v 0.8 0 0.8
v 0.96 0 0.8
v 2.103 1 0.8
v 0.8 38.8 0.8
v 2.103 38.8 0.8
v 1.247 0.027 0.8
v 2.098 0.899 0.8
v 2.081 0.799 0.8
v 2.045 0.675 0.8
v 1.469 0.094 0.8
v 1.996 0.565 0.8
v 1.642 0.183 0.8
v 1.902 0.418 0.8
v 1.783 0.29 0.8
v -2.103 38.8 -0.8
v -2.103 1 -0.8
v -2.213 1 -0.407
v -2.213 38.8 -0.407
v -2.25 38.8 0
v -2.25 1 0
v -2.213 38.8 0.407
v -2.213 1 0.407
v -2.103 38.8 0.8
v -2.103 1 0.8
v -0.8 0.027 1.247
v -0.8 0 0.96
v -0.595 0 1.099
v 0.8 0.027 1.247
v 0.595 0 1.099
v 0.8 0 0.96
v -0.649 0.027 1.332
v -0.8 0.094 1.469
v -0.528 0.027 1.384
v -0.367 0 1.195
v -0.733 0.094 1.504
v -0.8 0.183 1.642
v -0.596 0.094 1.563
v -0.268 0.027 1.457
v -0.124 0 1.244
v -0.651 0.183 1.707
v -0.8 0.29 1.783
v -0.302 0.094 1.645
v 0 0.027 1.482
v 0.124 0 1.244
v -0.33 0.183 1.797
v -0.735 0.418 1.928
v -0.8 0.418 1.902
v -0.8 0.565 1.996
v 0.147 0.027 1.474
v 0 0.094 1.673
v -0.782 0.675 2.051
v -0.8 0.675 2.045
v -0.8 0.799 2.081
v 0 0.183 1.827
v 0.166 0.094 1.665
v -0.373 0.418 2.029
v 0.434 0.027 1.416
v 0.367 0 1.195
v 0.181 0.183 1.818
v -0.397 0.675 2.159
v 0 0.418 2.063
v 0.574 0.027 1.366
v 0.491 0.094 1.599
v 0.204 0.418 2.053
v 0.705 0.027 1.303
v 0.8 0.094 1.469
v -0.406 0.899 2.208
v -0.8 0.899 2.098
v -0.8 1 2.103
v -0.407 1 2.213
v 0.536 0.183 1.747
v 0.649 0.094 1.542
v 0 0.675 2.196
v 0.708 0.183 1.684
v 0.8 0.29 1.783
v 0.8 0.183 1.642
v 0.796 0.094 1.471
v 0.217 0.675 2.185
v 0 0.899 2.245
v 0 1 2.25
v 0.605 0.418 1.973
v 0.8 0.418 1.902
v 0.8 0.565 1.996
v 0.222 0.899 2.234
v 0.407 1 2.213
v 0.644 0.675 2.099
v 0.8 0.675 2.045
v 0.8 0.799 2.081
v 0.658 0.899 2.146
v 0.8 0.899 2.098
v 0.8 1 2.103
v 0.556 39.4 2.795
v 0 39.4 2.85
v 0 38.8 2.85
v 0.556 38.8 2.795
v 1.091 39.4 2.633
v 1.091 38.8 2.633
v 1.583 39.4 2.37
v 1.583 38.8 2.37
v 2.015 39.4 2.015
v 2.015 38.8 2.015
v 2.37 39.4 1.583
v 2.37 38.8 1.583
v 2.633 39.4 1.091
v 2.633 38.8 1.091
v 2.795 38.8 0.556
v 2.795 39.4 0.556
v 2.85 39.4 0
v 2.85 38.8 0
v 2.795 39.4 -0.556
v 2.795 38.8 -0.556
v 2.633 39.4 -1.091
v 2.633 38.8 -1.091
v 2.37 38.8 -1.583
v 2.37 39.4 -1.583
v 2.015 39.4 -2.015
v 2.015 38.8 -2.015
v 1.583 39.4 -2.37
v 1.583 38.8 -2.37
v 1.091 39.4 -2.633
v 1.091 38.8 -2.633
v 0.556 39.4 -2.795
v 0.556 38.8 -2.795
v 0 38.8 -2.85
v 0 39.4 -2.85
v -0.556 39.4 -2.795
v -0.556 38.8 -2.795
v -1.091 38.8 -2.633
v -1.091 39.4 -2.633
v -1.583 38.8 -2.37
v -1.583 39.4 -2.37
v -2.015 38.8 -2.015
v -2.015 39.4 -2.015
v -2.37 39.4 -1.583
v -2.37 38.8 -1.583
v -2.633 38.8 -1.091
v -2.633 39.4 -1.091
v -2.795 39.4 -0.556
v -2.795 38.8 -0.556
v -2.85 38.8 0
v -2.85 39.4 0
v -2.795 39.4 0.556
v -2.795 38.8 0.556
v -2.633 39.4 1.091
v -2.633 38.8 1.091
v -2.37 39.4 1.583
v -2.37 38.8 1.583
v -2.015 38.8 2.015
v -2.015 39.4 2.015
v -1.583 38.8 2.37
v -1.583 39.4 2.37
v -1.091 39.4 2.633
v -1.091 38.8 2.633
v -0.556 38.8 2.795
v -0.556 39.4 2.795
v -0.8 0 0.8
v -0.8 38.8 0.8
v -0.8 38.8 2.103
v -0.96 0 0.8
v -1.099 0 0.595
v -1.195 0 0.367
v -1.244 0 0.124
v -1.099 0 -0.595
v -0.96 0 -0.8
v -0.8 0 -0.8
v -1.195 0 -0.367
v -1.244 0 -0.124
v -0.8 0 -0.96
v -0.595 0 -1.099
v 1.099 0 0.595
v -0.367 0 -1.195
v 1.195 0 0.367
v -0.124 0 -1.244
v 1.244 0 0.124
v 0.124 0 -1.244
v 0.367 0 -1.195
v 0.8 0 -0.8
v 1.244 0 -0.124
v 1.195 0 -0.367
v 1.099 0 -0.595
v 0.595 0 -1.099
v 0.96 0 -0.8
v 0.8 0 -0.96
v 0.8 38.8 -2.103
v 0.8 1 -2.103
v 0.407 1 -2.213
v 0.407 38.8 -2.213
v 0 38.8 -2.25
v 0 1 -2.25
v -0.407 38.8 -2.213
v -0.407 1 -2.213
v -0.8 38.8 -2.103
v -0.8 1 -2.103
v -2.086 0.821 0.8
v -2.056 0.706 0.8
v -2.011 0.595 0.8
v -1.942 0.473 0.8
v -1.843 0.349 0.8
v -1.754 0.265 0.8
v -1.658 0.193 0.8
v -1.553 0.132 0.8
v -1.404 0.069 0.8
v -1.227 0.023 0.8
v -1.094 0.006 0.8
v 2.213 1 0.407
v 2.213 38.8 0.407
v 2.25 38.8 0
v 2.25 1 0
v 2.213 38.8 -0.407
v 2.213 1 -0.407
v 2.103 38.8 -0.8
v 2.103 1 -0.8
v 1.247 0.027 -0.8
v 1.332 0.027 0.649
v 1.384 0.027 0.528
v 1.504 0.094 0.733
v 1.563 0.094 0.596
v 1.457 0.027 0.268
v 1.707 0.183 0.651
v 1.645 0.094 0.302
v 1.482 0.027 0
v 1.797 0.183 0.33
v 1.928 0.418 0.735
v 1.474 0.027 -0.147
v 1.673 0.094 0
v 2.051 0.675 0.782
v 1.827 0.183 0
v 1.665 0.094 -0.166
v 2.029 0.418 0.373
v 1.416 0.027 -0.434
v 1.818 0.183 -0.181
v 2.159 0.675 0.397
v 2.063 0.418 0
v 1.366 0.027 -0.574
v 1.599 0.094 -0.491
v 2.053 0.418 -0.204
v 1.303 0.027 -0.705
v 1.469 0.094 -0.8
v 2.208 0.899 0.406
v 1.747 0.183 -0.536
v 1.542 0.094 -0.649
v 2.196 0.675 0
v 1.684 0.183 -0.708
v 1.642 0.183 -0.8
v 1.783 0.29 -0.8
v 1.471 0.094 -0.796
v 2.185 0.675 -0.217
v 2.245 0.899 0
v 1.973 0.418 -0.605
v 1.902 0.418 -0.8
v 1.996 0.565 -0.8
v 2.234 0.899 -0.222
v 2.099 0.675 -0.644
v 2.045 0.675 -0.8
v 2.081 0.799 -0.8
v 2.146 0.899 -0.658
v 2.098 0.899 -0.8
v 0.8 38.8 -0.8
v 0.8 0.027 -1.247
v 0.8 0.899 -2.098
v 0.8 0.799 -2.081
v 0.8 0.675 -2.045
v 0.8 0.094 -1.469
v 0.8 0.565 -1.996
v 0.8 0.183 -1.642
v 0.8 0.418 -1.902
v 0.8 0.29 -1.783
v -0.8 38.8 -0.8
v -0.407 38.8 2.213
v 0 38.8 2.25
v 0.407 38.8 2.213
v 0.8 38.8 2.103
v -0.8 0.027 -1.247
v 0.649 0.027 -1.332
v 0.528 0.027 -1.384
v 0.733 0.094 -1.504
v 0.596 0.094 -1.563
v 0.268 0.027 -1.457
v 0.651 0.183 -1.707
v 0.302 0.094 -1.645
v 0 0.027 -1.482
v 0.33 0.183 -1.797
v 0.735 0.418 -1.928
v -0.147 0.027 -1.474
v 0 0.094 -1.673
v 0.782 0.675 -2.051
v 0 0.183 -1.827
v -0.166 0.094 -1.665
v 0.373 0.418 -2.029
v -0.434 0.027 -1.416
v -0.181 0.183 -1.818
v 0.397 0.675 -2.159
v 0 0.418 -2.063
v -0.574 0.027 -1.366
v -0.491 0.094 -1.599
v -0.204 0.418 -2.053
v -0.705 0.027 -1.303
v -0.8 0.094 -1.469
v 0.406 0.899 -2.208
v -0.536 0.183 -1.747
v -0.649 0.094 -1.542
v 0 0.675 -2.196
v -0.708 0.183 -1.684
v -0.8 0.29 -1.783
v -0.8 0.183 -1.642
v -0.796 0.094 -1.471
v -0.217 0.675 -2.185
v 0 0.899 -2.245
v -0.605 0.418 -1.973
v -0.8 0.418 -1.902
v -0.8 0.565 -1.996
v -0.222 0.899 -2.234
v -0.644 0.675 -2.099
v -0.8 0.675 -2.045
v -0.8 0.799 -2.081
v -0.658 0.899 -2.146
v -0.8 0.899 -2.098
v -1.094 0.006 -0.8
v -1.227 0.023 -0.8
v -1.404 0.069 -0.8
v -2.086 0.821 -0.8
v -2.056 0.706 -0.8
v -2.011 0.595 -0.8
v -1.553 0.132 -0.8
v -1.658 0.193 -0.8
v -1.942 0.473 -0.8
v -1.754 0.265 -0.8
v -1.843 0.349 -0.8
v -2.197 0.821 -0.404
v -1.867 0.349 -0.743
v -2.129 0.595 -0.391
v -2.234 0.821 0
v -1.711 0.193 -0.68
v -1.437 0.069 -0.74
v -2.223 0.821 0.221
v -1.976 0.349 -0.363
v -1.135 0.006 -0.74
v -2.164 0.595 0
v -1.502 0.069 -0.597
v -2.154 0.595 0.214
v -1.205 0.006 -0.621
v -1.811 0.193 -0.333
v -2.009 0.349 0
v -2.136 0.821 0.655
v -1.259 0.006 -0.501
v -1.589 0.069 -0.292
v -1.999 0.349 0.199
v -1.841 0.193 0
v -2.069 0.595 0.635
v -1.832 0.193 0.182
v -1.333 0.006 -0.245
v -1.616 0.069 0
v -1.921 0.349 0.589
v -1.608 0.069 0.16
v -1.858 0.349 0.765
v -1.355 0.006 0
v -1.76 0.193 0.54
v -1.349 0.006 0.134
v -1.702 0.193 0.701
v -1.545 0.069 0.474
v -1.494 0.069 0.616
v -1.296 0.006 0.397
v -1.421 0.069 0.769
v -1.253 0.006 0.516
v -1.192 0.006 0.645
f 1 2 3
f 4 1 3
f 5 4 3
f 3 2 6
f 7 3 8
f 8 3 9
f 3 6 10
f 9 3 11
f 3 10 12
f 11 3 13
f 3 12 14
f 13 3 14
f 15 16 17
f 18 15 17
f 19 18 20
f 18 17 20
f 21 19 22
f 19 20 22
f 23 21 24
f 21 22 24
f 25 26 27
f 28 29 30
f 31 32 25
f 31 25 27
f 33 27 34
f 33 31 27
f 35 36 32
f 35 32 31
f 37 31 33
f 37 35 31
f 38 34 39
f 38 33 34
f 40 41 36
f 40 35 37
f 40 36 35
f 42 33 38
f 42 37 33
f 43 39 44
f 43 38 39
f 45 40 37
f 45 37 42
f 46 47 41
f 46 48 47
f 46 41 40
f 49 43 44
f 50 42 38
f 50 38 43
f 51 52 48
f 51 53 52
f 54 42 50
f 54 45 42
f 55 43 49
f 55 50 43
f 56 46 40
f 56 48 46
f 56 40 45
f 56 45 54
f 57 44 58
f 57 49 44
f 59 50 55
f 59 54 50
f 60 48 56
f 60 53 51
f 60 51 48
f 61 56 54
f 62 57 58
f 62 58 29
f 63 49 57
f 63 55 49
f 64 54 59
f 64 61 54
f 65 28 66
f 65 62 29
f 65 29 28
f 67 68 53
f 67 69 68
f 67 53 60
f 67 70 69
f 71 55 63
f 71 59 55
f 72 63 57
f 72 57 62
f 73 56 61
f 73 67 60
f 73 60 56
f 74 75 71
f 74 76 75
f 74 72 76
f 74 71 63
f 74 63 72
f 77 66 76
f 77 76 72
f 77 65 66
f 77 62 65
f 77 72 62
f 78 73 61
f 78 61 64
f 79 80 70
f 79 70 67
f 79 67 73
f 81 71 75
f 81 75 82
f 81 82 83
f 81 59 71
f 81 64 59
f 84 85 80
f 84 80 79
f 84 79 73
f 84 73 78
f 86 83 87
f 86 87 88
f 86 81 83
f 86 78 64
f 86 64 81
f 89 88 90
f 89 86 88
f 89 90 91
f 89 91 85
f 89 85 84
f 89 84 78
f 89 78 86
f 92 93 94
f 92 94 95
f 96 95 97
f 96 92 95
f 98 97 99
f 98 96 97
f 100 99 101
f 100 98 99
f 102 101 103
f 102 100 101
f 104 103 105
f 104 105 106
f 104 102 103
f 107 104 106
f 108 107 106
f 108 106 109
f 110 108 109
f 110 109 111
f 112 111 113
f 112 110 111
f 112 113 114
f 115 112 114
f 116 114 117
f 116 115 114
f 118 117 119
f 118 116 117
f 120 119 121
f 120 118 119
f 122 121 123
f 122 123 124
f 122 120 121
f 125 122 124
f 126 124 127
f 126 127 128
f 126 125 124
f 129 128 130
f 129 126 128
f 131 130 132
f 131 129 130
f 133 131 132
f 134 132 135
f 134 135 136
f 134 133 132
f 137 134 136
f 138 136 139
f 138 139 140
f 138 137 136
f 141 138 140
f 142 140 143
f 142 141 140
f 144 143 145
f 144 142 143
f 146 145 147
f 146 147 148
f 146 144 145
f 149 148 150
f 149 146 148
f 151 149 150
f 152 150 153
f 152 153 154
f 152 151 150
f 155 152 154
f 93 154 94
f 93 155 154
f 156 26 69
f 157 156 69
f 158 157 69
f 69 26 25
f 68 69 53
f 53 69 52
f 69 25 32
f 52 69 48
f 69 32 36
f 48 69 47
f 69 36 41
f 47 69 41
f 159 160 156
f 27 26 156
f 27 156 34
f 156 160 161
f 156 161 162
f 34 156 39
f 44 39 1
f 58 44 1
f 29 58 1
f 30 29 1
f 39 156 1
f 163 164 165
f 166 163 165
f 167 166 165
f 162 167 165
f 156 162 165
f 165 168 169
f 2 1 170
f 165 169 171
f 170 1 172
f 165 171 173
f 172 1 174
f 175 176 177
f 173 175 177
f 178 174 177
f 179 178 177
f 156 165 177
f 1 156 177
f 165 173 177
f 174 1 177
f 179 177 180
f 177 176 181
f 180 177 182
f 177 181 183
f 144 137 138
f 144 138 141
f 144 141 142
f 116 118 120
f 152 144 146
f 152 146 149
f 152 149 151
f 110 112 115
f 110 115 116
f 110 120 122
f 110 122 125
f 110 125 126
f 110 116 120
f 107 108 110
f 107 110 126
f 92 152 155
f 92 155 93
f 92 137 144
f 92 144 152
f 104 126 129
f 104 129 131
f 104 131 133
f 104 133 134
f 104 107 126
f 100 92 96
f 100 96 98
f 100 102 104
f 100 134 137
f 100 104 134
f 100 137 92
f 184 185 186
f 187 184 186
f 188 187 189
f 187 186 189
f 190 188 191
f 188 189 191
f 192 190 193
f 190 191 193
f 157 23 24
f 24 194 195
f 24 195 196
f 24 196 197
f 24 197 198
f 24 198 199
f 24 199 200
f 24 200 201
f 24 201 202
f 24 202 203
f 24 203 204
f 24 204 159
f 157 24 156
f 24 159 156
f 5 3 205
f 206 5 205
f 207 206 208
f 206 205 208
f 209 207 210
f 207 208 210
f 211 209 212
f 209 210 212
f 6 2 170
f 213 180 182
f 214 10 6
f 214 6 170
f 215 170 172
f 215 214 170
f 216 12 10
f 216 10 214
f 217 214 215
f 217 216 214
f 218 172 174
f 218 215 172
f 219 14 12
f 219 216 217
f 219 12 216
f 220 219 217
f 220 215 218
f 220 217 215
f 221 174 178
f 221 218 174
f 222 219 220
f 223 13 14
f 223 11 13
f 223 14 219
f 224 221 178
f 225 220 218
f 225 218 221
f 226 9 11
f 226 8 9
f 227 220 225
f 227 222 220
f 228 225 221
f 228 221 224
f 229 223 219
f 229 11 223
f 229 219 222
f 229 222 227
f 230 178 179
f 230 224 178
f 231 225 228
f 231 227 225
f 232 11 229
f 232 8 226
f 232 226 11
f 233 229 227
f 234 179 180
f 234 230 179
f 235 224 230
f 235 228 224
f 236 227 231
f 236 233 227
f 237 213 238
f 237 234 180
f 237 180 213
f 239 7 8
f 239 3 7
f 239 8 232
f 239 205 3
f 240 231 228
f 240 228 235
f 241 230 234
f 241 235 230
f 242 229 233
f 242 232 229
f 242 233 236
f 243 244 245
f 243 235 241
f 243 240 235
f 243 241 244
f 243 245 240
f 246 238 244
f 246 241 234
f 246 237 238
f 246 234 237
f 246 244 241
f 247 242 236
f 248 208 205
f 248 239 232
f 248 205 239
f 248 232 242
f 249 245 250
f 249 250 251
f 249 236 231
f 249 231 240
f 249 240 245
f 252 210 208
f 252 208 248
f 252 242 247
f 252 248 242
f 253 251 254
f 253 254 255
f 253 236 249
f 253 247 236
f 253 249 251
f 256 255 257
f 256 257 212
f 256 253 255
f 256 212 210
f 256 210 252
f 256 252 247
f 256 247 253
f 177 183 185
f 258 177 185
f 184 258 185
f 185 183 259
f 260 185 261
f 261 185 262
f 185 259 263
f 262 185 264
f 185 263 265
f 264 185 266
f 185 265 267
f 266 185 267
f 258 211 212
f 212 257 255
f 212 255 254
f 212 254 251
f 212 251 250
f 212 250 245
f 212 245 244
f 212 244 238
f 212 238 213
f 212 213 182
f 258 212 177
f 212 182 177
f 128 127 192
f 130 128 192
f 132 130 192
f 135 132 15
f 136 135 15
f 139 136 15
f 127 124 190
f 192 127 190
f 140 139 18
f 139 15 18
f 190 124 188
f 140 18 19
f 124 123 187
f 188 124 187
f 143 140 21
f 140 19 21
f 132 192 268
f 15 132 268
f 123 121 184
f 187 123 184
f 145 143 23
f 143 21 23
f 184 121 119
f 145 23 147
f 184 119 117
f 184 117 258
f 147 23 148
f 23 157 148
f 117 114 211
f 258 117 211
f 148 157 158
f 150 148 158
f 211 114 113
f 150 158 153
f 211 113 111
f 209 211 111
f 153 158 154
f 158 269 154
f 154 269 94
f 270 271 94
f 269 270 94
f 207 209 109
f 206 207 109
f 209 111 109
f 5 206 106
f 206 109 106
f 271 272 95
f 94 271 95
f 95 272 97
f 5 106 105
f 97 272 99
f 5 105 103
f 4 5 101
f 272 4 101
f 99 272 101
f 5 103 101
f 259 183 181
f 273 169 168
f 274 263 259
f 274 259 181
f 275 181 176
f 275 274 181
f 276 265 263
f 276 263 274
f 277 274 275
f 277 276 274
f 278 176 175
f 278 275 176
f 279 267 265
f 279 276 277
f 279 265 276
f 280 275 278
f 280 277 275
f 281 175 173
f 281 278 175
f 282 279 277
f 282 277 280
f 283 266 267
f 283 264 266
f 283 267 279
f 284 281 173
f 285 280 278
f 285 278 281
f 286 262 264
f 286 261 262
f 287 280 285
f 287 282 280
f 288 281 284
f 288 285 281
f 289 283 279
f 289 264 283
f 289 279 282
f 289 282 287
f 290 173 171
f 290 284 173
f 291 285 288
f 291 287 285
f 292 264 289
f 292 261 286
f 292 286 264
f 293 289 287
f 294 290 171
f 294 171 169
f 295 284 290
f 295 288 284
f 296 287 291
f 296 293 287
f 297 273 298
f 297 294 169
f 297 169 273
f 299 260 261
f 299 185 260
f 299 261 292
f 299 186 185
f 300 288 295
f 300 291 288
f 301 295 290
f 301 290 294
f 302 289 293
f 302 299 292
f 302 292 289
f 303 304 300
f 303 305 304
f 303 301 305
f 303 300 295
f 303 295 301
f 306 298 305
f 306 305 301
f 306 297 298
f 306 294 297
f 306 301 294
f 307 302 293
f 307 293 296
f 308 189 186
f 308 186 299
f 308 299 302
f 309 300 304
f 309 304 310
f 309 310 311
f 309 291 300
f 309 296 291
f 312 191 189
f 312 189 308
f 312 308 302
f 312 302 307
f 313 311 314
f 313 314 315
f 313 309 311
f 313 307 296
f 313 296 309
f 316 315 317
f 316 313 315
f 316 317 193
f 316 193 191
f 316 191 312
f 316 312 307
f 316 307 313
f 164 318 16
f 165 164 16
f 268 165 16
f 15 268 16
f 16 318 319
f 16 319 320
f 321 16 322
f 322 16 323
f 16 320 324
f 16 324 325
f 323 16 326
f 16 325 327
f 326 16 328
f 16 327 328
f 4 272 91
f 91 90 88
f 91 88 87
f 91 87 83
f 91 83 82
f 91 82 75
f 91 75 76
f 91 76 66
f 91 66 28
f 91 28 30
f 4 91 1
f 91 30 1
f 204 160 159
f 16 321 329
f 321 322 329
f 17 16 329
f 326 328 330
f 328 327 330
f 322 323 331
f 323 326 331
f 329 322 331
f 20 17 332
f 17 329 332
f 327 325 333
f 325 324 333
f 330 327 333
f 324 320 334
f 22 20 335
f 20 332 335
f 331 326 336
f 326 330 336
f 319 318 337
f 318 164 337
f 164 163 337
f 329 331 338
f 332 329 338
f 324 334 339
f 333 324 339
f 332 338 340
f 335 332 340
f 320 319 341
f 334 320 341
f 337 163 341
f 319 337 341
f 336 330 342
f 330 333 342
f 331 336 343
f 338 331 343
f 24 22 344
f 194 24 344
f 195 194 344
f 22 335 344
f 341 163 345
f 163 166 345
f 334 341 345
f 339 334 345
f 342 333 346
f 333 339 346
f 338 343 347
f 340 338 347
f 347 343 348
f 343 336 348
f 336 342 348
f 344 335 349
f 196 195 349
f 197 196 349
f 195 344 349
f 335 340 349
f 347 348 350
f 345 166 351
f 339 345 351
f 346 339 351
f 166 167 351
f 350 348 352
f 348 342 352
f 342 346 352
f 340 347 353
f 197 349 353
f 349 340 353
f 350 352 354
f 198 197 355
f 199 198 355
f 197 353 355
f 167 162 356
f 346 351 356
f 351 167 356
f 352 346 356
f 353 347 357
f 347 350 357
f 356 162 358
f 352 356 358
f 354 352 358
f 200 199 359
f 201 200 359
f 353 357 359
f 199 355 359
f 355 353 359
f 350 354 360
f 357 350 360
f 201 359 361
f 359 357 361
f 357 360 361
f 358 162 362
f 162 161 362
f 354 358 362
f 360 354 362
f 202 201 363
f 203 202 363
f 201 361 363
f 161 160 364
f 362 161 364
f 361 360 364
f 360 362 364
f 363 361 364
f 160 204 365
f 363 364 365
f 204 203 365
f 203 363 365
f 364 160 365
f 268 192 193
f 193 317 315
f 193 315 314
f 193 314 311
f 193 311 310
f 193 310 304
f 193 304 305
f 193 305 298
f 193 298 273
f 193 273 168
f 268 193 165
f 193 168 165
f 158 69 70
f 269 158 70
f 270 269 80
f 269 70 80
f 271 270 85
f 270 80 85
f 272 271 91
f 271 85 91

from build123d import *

# Parameters (mm, degrees)
BOSS_EXTRUDE1_DEPTH = 39.4
FILLET1_R           = 1
FILLET2_R           = 1
FILLET3_R           = 1
FILLET4_R           = 1
SKETCH3_R           = 2.85
BOSS_EXTRUDE2_DEPTH = 0.6


with BuildPart() as part:
    # Sketch1 → Boss-Extrude1 (new body)
    with BuildSketch(Plane(origin=(0, 0, 0), x_dir=(1, 0, 0), z_dir=(0, 1, 0))):
        with BuildLine():
            Line((-0.8, -0.8), (-0.8, -2.102974084))
            ThreePointArc((-0.8, -2.102974084), (0, -2.25), (0.8, -2.102974084))
            Line((0.8, -2.102974084), (0.8, -0.8))
            Line((0.8, -0.8), (2.102974084, -0.8))
            ThreePointArc((2.102974084, -0.8), (2.25, 0), (2.102974084, 0.8))
            Line((2.102974084, 0.8), (0.8, 0.8))
            Line((0.8, 0.8), (0.8, 2.102974084))
            ThreePointArc((0.8, 2.102974084), (0, 2.25), (-0.8, 2.102974084))
            Line((-0.8, 2.102974084), (-0.8, 0.8))
            Line((-0.8, 0.8), (-2.102974084, 0.8))
            ThreePointArc((-2.102974084, 0.8), (-2.25, 0), (-2.102974084, -0.8))
            Line((-2.102974084, -0.8), (-0.8, -0.8))
        make_face()
    extrude(amount=BOSS_EXTRUDE1_DEPTH)

    # Fillet1
    fillet1_edges = [part.edges().sort_by_distance(p)[0] for p in [
        (-2.25, 0, 0),
    ]]
    fillet(fillet1_edges, radius=FILLET1_R)

    # Fillet2
    fillet2_edges = [part.edges().sort_by_distance(p)[0] for p in [
        (0, 0, 2.25),
    ]]
    fillet(fillet2_edges, radius=FILLET2_R)

    # Fillet3
    fillet3_edges = [part.edges().sort_by_distance(p)[0] for p in [
        (2.25, 0, 0),
    ]]
    fillet(fillet3_edges, radius=FILLET3_R)

    # Fillet4
    fillet4_edges = [part.edges().sort_by_distance(p)[0] for p in [
        (0, 0, -2.25),
    ]]
    fillet(fillet4_edges, radius=FILLET4_R)

    # Sketch3 → Boss-Extrude2 (add)
    with BuildSketch(Plane(origin=(0, 39.4, 0), x_dir=(1, 0, 0), z_dir=(0, 1, 0))):
        with Locations(Location((0, 0, 0), (0, 0, 270))):
            Circle(SKETCH3_R)
    extrude(amount=-BOSS_EXTRUDE2_DEPTH)


solid = part.part
